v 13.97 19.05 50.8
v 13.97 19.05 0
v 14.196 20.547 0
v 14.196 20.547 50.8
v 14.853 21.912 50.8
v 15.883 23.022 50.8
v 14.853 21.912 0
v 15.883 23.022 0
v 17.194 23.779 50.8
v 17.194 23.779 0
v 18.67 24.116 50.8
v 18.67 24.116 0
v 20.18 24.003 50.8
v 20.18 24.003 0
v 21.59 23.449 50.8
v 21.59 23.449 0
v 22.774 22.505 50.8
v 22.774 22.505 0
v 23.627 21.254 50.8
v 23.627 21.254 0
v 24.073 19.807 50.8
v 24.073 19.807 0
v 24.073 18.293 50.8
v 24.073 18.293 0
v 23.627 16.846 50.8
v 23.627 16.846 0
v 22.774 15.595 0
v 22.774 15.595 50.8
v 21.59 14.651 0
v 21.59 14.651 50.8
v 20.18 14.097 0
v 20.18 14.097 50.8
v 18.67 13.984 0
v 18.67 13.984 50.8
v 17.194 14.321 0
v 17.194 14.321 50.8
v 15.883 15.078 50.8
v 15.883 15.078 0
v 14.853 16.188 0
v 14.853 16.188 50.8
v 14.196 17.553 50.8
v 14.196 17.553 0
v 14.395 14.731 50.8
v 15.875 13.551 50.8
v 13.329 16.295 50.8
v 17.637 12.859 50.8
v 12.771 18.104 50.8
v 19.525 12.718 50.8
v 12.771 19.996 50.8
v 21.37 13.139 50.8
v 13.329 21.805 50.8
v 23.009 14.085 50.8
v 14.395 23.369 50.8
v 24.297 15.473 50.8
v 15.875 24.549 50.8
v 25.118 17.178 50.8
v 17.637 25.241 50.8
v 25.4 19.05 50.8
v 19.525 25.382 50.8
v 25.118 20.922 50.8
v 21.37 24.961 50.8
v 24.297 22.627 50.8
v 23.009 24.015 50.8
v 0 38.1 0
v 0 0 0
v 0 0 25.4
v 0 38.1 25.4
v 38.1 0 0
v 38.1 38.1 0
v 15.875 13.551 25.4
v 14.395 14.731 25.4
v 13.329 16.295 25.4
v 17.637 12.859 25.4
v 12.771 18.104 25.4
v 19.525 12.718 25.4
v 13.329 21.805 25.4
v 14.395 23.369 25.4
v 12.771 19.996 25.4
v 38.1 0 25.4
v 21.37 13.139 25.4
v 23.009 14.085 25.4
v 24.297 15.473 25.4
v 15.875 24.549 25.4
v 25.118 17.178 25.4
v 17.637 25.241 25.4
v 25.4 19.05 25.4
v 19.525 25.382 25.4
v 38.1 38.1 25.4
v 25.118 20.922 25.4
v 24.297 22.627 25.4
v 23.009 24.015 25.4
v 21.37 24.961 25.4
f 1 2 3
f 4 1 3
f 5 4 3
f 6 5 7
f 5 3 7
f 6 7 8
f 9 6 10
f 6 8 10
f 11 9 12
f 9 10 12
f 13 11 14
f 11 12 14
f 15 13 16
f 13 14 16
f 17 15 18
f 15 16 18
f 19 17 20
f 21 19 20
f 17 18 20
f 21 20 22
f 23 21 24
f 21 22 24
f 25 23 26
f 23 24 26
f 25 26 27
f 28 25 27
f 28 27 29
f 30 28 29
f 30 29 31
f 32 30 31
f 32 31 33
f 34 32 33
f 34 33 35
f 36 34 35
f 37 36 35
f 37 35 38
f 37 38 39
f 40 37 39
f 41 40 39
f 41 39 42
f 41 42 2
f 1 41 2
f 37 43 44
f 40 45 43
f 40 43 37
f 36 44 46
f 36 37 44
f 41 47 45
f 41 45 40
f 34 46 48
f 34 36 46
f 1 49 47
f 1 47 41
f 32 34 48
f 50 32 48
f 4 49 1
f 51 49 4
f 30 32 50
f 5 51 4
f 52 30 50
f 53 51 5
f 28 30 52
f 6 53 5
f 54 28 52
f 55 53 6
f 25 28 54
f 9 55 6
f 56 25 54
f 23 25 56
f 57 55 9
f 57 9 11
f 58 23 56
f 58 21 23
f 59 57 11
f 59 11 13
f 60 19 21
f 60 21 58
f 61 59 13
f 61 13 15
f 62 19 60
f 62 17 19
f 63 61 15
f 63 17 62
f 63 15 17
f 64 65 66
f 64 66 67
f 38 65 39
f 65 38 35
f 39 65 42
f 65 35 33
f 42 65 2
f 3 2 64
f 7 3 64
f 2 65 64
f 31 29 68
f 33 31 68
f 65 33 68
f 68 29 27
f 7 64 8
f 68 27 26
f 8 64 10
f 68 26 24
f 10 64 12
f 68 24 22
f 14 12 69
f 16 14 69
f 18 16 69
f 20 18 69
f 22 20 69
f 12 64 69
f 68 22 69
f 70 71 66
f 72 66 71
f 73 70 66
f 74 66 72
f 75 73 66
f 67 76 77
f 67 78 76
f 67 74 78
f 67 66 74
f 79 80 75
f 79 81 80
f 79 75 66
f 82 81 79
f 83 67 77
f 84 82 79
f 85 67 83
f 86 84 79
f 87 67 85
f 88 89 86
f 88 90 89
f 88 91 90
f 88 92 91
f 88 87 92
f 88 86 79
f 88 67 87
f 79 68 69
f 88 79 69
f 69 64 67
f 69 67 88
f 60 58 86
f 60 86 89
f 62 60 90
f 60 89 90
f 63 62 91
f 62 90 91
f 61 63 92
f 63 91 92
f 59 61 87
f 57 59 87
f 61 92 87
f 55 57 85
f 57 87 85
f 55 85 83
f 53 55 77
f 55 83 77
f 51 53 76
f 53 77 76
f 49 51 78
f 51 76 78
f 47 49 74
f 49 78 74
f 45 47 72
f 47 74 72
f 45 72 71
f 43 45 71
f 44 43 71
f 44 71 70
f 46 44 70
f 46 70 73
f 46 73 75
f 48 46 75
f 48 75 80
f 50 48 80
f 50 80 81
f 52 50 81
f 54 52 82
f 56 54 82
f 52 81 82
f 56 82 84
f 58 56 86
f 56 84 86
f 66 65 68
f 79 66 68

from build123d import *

# Parameters (mm, degrees)
F0_W     = 38.1
F0_H     = 38.1
F1_DEPTH = 25.4
F3_R     = 6.35
F4_DEPTH = 25.4
F7_D     = 10.16


with BuildPart() as f1:
    # F0 (on Top) → F1 (new body)
    with BuildSketch(Plane.XY):
        with Locations((19.05, 19.05)):
            Rectangle(F0_W, F0_H)
    extrude(amount=F1_DEPTH)

    # F3 (on offset) → F4 (join)
    with BuildSketch(Plane.XY.offset(25.4)):
        with Locations((19.05, 19.05)):
            Circle(F3_R)
    extrude(amount=F4_DEPTH)

    # F7 (through all)
    with Locations(Plane.XY.offset(50.8)):
        with Locations((19.05, 19.05)):
            Hole(F7_D / 2)


solid = f1.part
